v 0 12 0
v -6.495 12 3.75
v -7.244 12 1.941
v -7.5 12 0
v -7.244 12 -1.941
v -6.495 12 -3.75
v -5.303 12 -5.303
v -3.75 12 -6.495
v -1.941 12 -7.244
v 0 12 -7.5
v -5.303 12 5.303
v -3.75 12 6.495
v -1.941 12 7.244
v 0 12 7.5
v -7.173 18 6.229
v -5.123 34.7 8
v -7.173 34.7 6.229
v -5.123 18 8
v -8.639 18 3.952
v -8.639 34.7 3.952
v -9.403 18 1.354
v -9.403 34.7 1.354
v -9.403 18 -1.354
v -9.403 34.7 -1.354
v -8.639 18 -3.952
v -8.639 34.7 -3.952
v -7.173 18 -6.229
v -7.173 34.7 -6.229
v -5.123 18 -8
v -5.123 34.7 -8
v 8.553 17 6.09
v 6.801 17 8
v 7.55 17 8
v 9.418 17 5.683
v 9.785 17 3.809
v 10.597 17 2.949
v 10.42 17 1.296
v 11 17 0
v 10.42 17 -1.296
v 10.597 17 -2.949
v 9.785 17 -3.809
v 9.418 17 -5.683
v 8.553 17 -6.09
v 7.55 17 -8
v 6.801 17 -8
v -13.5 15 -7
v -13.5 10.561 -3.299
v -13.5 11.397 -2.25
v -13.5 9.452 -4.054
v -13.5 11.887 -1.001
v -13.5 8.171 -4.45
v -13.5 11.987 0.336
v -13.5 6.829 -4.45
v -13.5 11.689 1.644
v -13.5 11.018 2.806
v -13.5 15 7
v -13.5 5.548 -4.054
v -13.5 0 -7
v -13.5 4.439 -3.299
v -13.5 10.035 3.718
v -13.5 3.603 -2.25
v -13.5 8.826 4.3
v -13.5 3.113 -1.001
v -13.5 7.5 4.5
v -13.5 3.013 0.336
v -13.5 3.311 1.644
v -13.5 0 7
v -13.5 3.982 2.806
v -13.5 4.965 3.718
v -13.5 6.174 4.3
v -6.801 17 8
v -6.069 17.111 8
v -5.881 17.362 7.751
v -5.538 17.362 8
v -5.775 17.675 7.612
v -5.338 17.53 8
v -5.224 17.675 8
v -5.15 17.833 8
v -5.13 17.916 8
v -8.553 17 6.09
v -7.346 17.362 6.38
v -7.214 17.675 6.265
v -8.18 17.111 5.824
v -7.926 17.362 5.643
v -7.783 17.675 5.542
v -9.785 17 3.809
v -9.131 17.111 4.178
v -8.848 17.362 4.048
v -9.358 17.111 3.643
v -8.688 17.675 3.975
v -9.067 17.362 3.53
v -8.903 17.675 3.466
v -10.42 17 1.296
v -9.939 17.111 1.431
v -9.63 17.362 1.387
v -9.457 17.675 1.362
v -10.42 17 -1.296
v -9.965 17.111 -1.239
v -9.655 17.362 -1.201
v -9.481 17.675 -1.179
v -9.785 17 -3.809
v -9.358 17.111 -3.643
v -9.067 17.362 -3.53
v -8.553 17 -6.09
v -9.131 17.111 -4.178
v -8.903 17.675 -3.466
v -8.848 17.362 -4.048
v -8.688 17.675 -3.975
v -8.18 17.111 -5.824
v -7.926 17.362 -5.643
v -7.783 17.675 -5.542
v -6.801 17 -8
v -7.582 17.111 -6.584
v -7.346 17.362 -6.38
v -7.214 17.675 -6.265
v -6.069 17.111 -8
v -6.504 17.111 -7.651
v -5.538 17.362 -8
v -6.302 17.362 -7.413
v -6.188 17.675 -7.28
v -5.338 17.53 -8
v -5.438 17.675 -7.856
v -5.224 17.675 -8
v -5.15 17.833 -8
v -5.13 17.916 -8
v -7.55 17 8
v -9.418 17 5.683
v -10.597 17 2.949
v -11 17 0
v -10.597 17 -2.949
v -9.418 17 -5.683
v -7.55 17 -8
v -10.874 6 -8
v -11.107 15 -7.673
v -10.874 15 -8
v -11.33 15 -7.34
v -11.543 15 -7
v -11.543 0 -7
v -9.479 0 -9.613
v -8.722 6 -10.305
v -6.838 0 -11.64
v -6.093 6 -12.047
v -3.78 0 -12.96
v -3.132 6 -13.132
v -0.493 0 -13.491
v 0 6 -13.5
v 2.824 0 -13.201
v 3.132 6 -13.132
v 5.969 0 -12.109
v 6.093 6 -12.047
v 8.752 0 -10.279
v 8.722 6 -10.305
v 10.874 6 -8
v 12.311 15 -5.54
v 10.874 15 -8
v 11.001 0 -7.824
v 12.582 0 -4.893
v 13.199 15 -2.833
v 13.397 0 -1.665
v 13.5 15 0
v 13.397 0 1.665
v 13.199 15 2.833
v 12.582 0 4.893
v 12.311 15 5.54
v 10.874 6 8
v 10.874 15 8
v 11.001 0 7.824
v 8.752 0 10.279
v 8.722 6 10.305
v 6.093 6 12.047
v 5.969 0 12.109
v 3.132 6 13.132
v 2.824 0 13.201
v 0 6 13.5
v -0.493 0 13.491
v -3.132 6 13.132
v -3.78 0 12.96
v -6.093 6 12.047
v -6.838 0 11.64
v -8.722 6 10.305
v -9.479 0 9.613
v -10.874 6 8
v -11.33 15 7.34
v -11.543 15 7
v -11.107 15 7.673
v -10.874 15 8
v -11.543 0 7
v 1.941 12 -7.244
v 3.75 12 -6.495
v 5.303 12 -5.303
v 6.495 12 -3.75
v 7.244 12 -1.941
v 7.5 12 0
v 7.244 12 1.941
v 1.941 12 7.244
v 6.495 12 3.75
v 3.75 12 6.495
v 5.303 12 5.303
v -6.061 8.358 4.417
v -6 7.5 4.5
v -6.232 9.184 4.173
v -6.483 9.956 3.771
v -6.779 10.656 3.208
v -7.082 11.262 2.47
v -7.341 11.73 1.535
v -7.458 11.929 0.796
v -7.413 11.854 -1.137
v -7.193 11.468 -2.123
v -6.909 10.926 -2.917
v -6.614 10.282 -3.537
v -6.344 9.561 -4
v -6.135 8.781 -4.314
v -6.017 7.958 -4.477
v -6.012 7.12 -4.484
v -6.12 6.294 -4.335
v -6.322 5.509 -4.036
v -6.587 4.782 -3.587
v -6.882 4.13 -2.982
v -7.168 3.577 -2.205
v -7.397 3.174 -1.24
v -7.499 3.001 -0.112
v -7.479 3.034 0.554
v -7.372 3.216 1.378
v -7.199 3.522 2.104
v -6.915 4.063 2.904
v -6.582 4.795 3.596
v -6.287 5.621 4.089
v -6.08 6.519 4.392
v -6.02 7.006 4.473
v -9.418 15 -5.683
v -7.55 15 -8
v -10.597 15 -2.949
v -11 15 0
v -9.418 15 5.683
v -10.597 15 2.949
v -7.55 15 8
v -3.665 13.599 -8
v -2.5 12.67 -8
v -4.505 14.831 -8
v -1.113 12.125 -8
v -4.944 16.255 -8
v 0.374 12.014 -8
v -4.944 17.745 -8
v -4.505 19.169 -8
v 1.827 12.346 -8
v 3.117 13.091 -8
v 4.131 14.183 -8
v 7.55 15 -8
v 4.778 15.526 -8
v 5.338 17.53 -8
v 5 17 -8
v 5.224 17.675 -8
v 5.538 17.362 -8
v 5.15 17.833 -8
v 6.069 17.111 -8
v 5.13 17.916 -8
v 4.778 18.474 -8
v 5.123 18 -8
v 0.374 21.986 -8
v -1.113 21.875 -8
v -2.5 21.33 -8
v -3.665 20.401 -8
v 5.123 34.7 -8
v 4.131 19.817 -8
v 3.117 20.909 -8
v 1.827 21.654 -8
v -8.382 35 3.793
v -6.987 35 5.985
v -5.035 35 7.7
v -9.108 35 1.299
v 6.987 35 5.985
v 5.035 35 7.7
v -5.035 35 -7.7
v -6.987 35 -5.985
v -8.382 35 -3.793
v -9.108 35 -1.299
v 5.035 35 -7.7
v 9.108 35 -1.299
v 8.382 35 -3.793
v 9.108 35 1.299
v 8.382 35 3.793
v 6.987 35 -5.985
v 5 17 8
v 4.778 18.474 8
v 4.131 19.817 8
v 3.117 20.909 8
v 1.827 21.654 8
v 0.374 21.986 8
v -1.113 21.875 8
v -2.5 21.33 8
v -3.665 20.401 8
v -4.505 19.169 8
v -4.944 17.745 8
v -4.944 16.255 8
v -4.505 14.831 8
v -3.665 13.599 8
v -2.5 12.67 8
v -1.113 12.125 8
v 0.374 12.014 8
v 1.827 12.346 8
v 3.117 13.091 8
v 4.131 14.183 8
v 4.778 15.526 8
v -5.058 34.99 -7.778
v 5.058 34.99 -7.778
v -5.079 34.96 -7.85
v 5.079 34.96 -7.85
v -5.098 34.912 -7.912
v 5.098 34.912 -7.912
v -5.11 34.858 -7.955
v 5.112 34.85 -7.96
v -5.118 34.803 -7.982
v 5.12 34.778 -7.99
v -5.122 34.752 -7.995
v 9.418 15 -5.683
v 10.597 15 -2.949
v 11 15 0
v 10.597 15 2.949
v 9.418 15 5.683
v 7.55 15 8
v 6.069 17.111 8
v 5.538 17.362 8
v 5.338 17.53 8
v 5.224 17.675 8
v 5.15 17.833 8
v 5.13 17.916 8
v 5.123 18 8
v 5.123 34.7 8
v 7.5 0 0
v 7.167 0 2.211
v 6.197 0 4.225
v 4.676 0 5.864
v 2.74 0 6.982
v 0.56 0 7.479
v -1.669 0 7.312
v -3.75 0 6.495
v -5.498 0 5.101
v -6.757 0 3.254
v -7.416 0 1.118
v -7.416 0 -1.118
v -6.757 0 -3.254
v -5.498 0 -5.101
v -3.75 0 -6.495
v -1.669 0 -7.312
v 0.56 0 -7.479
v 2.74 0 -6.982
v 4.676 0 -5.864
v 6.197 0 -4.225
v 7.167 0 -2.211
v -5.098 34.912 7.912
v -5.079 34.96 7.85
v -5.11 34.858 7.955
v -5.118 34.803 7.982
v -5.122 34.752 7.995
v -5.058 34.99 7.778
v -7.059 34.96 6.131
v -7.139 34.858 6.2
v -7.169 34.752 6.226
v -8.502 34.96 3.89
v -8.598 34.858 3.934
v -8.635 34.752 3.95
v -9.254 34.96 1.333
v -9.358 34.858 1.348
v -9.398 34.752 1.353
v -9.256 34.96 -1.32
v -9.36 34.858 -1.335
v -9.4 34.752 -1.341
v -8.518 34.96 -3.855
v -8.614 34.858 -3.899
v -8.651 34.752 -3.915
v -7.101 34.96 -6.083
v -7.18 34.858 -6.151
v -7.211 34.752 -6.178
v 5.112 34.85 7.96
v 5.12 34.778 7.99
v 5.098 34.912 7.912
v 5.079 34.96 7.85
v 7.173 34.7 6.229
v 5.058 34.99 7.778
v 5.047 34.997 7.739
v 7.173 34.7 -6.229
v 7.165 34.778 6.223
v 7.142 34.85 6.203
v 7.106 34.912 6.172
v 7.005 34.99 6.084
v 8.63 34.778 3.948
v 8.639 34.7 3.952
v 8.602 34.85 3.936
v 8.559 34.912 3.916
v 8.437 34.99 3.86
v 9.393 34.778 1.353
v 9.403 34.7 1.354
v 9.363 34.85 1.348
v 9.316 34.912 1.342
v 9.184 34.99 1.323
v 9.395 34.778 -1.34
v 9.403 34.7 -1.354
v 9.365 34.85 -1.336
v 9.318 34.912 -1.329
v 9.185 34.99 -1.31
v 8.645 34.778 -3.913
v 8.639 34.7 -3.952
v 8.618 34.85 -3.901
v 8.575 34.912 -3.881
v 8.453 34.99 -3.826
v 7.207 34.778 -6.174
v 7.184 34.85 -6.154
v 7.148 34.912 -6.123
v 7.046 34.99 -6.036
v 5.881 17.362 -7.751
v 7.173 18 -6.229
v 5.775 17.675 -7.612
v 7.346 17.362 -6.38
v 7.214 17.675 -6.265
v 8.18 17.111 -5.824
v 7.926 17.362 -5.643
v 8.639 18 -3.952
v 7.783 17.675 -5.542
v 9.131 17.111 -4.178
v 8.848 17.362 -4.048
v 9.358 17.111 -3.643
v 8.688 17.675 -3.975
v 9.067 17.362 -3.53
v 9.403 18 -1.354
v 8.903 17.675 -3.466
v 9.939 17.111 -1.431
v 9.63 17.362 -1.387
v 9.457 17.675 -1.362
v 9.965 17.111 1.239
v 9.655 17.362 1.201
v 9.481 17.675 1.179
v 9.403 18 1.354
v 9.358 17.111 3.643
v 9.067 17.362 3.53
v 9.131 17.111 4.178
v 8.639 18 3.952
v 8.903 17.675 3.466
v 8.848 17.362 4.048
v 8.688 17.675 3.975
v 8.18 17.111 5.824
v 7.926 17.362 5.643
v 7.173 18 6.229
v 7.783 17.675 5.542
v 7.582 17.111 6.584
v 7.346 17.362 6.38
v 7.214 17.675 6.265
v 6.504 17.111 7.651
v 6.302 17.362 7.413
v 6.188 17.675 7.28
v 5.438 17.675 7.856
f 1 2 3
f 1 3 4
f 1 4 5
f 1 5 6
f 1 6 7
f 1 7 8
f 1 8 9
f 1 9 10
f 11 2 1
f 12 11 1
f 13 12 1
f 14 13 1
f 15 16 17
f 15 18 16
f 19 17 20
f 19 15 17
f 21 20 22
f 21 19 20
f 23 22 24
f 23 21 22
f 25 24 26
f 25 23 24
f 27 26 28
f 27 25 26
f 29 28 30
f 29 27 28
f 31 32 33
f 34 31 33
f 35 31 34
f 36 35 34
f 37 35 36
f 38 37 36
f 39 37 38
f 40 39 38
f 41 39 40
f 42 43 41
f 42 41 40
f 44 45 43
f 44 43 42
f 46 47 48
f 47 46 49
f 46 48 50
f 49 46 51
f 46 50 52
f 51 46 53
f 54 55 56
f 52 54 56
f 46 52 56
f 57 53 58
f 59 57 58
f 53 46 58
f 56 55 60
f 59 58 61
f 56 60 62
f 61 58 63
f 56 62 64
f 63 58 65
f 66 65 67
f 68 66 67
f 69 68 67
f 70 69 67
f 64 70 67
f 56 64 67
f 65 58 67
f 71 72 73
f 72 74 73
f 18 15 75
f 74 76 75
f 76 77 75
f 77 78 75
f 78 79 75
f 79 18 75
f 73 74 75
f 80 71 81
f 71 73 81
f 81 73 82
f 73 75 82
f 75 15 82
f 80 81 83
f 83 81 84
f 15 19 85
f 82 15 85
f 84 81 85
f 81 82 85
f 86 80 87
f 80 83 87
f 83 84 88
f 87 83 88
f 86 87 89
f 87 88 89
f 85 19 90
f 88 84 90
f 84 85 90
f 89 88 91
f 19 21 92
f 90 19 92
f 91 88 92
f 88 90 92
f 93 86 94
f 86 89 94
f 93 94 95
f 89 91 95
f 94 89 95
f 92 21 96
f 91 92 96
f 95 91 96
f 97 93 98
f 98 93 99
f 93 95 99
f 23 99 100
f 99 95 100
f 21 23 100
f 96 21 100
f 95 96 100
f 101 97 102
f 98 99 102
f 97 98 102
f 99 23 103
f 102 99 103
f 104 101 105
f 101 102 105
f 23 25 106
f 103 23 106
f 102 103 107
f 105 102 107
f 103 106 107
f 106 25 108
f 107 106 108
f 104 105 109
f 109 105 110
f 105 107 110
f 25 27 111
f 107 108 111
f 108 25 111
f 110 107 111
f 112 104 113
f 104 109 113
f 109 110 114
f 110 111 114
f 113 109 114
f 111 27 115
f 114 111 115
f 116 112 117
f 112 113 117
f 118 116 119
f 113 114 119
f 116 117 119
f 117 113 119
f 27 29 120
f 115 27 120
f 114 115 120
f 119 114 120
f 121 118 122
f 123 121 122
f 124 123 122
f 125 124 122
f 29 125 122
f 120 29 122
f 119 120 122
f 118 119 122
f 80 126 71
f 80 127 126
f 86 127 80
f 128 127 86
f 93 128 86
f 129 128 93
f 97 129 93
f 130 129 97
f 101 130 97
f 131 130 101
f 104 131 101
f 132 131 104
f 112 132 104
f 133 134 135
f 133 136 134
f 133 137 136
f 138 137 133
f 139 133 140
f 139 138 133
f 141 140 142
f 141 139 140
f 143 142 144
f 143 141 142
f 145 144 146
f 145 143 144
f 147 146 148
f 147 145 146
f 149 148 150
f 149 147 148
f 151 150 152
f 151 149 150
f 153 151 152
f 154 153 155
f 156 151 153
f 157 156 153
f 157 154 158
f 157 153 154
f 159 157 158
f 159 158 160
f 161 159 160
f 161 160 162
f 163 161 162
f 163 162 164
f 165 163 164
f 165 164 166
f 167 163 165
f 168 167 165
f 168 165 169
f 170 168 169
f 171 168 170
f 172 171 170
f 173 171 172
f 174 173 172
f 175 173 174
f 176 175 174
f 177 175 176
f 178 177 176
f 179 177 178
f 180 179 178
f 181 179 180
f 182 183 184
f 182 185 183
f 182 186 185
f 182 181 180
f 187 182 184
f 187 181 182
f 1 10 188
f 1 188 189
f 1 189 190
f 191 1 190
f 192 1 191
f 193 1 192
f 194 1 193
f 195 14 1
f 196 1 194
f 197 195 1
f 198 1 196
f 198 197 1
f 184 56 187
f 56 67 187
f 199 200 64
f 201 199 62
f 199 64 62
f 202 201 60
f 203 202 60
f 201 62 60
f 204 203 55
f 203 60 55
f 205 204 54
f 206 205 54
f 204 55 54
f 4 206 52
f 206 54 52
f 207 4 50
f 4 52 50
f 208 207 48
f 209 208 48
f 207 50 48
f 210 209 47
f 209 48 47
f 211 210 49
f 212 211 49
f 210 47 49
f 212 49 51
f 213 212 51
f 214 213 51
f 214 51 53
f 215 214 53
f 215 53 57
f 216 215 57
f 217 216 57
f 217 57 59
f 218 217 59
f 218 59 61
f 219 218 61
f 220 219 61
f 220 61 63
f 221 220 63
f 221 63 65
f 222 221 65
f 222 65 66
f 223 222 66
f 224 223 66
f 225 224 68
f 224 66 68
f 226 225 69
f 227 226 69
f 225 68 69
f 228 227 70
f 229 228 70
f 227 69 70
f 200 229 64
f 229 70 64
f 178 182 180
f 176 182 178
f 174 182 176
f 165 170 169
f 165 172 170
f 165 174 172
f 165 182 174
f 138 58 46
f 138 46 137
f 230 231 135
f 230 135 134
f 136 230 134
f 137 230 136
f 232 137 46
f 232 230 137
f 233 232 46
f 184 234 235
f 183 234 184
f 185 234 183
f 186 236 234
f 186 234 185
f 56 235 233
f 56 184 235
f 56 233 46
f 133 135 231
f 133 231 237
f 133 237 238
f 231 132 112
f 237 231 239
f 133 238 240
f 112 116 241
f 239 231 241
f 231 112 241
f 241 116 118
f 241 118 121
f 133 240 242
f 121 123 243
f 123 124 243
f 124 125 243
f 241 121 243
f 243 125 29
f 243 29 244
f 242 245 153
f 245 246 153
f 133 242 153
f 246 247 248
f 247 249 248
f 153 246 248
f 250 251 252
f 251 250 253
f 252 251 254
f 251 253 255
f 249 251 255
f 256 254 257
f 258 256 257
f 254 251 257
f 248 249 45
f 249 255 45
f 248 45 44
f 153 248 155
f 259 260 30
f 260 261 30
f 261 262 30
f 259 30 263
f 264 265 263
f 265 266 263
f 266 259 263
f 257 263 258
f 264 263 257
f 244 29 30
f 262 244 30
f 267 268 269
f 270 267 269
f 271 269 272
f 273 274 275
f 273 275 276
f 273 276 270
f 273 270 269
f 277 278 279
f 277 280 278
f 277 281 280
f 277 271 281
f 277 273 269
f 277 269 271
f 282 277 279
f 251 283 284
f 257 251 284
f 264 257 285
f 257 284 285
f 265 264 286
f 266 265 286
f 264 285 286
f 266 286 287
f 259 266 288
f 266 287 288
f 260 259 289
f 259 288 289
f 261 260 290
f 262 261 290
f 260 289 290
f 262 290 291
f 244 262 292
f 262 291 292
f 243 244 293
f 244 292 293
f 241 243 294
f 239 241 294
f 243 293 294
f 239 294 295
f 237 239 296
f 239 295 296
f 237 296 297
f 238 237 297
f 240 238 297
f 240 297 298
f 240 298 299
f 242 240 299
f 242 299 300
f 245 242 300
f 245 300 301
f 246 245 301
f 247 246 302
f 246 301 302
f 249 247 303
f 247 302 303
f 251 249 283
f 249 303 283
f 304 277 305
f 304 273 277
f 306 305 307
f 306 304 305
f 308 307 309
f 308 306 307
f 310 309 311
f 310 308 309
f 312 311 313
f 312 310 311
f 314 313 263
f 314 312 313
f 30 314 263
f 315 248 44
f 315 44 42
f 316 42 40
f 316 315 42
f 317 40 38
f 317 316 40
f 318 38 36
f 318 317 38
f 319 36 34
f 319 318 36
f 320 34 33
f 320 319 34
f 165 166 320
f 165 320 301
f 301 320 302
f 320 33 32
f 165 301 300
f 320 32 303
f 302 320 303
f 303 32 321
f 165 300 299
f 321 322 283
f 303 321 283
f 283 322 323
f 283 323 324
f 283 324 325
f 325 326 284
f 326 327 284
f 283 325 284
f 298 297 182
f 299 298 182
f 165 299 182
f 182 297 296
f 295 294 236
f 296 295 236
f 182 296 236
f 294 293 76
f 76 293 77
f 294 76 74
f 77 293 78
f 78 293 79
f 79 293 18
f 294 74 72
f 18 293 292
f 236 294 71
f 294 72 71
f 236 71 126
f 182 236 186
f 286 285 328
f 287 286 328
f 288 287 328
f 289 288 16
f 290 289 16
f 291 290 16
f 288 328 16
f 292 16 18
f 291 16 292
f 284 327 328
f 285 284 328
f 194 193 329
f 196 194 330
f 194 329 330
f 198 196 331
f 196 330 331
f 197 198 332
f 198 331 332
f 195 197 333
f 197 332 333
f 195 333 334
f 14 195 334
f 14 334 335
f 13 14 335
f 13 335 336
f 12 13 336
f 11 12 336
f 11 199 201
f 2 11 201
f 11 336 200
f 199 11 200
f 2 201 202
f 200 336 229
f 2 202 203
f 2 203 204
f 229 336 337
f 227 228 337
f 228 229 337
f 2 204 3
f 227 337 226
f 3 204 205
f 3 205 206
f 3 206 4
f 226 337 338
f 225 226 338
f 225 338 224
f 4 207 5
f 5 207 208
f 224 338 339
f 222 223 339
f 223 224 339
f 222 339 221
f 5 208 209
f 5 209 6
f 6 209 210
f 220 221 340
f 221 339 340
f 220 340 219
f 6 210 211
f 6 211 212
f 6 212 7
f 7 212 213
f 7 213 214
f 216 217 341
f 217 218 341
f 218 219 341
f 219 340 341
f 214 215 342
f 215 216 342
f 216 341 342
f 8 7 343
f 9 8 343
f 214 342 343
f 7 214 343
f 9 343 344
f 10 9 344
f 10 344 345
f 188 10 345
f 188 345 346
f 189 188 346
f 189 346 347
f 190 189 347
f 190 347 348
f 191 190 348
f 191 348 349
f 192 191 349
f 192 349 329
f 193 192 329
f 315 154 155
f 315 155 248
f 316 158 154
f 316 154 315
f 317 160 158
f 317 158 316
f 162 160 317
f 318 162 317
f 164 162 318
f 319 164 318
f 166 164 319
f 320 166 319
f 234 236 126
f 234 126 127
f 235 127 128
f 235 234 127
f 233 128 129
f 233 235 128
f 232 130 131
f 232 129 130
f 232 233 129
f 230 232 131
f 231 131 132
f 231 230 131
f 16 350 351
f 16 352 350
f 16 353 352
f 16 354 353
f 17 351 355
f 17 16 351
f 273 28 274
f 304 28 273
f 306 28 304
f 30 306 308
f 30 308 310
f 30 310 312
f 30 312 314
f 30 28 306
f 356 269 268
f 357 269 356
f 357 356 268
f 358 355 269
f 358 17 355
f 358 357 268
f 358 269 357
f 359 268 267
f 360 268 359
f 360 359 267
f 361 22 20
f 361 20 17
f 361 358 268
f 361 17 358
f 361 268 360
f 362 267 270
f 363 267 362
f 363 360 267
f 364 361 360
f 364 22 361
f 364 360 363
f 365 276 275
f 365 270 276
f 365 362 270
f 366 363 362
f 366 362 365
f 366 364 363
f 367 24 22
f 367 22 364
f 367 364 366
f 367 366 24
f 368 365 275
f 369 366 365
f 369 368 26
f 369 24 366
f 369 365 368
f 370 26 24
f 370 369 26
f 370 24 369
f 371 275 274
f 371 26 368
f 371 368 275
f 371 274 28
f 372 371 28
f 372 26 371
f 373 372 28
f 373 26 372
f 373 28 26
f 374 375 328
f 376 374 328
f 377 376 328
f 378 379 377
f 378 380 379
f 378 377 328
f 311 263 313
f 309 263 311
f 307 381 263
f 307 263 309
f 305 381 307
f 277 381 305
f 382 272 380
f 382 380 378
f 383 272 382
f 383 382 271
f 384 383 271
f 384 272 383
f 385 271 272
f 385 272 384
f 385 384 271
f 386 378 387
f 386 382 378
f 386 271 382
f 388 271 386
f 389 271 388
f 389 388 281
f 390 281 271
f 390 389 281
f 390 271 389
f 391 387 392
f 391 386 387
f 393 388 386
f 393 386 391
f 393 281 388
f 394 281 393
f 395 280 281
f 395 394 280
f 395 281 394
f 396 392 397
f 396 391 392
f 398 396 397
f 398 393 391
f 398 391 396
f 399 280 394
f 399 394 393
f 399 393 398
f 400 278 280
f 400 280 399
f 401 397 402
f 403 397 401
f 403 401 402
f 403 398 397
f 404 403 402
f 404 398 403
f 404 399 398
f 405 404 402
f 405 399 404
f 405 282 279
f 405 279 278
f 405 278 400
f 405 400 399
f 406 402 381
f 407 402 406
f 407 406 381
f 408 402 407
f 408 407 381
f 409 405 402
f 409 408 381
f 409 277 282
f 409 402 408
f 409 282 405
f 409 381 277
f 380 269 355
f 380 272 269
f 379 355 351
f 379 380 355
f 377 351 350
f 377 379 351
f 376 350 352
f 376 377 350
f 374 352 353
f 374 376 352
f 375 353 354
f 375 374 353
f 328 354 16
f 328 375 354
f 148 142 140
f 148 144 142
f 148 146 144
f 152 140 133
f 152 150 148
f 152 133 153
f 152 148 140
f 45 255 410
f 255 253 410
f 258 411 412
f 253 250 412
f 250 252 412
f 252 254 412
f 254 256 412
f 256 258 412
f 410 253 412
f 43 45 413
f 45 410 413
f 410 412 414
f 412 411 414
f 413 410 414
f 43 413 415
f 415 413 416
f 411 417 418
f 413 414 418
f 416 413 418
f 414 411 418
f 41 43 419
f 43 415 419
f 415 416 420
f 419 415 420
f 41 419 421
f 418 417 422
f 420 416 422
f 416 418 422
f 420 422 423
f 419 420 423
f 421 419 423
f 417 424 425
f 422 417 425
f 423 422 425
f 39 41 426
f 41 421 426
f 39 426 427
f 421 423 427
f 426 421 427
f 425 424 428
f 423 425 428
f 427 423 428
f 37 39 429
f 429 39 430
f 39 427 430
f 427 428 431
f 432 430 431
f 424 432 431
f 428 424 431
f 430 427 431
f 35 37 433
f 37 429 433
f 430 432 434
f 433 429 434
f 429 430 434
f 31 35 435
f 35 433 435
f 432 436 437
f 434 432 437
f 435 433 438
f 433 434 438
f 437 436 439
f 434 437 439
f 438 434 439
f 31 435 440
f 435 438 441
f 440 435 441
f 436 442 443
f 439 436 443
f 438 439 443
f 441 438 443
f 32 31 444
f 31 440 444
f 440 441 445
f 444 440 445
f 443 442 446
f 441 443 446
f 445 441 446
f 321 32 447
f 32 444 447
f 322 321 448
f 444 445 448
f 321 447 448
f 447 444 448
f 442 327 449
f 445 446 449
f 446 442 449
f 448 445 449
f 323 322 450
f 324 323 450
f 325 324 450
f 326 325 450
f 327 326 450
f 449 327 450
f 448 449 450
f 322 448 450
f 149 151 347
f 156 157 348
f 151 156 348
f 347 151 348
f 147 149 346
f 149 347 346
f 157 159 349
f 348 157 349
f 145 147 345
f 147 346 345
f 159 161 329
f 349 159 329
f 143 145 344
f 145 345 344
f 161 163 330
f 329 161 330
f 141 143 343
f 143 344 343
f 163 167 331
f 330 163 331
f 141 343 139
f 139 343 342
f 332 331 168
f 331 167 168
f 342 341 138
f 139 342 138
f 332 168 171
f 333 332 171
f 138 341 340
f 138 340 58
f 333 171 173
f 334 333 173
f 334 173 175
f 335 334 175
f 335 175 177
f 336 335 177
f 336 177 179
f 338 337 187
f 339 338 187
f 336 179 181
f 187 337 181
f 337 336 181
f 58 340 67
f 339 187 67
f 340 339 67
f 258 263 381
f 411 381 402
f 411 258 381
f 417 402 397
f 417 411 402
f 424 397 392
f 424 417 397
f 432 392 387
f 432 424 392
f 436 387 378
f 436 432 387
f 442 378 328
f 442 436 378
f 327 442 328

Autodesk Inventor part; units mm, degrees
ref_plane "YZ Plane" through (0, 0, 0) normal (1, 0, 0) x (0, 1, 0)
ref_plane "XZ Plane" through (0, 0, 0) normal (0, 1, 0) x (-1, 0, 0)
ref_plane "XY Plane" through (0, 0, 0) normal (0, 0, 1) x (1, 0, 0)
sketch "Sketch1" plane through (0, 0, 0) normal (0, 1, 0) x (-1, 0, 0)
  arc A0 (11.5434, 7) -> (11.5434, -7) centre (0, 0) ccw
  line L0 (13.5, -7) -> (13.5, 7)
  line L1 (13.5, -7) -> (11.5434, -7)
  line L2 (13.5, 7) -> (11.5434, 7)
  dimension "d0" = 27
  dimension "d2" = 14
extrude "Extrusion1" add sketch "Sketch1" along normal blind 15
sketch "Sketch2" plane through (0, 15, 0) normal (0, 1, 0) x (1, 0, 0)
  arc A0 (-11.5434, -7) -> (-11.5434, 7) centre (0, 0) ccw projected
  circle A1 centre (0, 0) radius 11
  dimension "d6" = 22
extrude "Extrusion2" add sketch "Sketch2" along normal blind 2
sketch "Sketch3" plane through (0, 17, 0) normal (0, 1, 0) x (1, 0, 0)
  circle A0 centre (0, 0) radius 9.5
  dimension "d9" = 19
extrude "Extrusion3" add sketch "Sketch3" along normal blind 2
fillet "Fillet1" radius 1 1 edges at (-9.5, 17, 0)
sketch "Sketch4" plane through (0, 19, 0) normal (0, 1, 0) x (1, 0, 0)
  circle A0 centre (0, 0) radius 9.5 projected
  circle A1 centre (0, 0) radius 10
  dimension "d13" = 20
extrude "Extrusion4" add sketch "Sketch4" along normal blind 16 contours A0
sketch "Sketch5" plane through (0, 35, 0) normal (0, 1, 0) x (1, 0, 0)
  circle A0 centre (0, 0) radius 9.5 projected
  line L0 (0, 0) -> (8, 0) construction
  line L1 (0, -8) -> (-19.2017, -8)
  line L2 (-19.2017, -8) -> (-19.2017, -21.9067)
  line L3 (-19.2017, -21.9067) -> (19.6427, -21.9067)
  line L4 (19.6427, -21.9067) -> (19.6427, -8)
  line L5 (19.6427, -8) -> (0, -8)
  line L6 (0, 8) -> (-19.2017, 8)
  line L7 (-19.2017, 8) -> (-19.2017, 24.6239)
  line L8 (-19.2017, 24.6239) -> (24.0089, 24.6239)
  line L9 (0, 8) -> (27.6995, 8)
  line L10 (27.6995, 8) -> (27.6995, 24.6239)
  line L11 (27.6995, 24.6239) -> (24.0089, 24.6239)
extrude "Extrusion5" cut sketch "Sketch5" against normal blind 29 contours L9 L6 A0 | A0 L6 L7 L8 L11 L10 L9 | L5 L4 L3 L2 L1 A0 | A0 L1 L5
sketch "Sketch6" plane through (-13.5, 0, -7) normal (-1, 0, 0) x (0, 0, 1)
  circle A0 centre (7, 7.5) radius 4.5
  point P0 (7, 0)
  dimension "d21" = 9
extrude "Extrusion6" cut sketch "Sketch6" against normal blind 19
sketch "Sketch7" plane through (0, 0, 0) normal (0, -1, 0) x (1, 0, 0)
  circle A0 centre (0, 0) radius 7.5
  dimension "d26" = 15
extrude "Extrusion7" cut sketch "Sketch7" against normal blind 12
thread "Thread1" size "M10x1" class "6g" standard "ISO Metric profile" full length
thread "Thread2" size "M20x1" class "6g" standard "ISO Metric profile" full length
fillet "Fillet2" radius 0.3 4 edges at (9.5, 35, 0) (-9.5, 35, 0) (0, 35, 8) (0, 35, -8)
thread "Thread3" size "M8x0.8" class "6H" standard "ISO Metric profile" full length
sketch "Sketch8" plane through (-10.8743, 6, 8) normal (0, 0, 1) x (1, 0, 0)
  circle A0 centre (10.8743, 11) radius 5
  point P0 (10.8743, -6)
  dimension "d34" = 10
extrude "Extrusion8" cut sketch "Sketch8" against normal blind 20
sketch "Sketch9" plane through (0, 0, 0) normal (0, -1, 0) x (1, 0, 0)
  point P0 (0, 0)
properties part number "zadnji deo klipa" material "ABS Plastic"
